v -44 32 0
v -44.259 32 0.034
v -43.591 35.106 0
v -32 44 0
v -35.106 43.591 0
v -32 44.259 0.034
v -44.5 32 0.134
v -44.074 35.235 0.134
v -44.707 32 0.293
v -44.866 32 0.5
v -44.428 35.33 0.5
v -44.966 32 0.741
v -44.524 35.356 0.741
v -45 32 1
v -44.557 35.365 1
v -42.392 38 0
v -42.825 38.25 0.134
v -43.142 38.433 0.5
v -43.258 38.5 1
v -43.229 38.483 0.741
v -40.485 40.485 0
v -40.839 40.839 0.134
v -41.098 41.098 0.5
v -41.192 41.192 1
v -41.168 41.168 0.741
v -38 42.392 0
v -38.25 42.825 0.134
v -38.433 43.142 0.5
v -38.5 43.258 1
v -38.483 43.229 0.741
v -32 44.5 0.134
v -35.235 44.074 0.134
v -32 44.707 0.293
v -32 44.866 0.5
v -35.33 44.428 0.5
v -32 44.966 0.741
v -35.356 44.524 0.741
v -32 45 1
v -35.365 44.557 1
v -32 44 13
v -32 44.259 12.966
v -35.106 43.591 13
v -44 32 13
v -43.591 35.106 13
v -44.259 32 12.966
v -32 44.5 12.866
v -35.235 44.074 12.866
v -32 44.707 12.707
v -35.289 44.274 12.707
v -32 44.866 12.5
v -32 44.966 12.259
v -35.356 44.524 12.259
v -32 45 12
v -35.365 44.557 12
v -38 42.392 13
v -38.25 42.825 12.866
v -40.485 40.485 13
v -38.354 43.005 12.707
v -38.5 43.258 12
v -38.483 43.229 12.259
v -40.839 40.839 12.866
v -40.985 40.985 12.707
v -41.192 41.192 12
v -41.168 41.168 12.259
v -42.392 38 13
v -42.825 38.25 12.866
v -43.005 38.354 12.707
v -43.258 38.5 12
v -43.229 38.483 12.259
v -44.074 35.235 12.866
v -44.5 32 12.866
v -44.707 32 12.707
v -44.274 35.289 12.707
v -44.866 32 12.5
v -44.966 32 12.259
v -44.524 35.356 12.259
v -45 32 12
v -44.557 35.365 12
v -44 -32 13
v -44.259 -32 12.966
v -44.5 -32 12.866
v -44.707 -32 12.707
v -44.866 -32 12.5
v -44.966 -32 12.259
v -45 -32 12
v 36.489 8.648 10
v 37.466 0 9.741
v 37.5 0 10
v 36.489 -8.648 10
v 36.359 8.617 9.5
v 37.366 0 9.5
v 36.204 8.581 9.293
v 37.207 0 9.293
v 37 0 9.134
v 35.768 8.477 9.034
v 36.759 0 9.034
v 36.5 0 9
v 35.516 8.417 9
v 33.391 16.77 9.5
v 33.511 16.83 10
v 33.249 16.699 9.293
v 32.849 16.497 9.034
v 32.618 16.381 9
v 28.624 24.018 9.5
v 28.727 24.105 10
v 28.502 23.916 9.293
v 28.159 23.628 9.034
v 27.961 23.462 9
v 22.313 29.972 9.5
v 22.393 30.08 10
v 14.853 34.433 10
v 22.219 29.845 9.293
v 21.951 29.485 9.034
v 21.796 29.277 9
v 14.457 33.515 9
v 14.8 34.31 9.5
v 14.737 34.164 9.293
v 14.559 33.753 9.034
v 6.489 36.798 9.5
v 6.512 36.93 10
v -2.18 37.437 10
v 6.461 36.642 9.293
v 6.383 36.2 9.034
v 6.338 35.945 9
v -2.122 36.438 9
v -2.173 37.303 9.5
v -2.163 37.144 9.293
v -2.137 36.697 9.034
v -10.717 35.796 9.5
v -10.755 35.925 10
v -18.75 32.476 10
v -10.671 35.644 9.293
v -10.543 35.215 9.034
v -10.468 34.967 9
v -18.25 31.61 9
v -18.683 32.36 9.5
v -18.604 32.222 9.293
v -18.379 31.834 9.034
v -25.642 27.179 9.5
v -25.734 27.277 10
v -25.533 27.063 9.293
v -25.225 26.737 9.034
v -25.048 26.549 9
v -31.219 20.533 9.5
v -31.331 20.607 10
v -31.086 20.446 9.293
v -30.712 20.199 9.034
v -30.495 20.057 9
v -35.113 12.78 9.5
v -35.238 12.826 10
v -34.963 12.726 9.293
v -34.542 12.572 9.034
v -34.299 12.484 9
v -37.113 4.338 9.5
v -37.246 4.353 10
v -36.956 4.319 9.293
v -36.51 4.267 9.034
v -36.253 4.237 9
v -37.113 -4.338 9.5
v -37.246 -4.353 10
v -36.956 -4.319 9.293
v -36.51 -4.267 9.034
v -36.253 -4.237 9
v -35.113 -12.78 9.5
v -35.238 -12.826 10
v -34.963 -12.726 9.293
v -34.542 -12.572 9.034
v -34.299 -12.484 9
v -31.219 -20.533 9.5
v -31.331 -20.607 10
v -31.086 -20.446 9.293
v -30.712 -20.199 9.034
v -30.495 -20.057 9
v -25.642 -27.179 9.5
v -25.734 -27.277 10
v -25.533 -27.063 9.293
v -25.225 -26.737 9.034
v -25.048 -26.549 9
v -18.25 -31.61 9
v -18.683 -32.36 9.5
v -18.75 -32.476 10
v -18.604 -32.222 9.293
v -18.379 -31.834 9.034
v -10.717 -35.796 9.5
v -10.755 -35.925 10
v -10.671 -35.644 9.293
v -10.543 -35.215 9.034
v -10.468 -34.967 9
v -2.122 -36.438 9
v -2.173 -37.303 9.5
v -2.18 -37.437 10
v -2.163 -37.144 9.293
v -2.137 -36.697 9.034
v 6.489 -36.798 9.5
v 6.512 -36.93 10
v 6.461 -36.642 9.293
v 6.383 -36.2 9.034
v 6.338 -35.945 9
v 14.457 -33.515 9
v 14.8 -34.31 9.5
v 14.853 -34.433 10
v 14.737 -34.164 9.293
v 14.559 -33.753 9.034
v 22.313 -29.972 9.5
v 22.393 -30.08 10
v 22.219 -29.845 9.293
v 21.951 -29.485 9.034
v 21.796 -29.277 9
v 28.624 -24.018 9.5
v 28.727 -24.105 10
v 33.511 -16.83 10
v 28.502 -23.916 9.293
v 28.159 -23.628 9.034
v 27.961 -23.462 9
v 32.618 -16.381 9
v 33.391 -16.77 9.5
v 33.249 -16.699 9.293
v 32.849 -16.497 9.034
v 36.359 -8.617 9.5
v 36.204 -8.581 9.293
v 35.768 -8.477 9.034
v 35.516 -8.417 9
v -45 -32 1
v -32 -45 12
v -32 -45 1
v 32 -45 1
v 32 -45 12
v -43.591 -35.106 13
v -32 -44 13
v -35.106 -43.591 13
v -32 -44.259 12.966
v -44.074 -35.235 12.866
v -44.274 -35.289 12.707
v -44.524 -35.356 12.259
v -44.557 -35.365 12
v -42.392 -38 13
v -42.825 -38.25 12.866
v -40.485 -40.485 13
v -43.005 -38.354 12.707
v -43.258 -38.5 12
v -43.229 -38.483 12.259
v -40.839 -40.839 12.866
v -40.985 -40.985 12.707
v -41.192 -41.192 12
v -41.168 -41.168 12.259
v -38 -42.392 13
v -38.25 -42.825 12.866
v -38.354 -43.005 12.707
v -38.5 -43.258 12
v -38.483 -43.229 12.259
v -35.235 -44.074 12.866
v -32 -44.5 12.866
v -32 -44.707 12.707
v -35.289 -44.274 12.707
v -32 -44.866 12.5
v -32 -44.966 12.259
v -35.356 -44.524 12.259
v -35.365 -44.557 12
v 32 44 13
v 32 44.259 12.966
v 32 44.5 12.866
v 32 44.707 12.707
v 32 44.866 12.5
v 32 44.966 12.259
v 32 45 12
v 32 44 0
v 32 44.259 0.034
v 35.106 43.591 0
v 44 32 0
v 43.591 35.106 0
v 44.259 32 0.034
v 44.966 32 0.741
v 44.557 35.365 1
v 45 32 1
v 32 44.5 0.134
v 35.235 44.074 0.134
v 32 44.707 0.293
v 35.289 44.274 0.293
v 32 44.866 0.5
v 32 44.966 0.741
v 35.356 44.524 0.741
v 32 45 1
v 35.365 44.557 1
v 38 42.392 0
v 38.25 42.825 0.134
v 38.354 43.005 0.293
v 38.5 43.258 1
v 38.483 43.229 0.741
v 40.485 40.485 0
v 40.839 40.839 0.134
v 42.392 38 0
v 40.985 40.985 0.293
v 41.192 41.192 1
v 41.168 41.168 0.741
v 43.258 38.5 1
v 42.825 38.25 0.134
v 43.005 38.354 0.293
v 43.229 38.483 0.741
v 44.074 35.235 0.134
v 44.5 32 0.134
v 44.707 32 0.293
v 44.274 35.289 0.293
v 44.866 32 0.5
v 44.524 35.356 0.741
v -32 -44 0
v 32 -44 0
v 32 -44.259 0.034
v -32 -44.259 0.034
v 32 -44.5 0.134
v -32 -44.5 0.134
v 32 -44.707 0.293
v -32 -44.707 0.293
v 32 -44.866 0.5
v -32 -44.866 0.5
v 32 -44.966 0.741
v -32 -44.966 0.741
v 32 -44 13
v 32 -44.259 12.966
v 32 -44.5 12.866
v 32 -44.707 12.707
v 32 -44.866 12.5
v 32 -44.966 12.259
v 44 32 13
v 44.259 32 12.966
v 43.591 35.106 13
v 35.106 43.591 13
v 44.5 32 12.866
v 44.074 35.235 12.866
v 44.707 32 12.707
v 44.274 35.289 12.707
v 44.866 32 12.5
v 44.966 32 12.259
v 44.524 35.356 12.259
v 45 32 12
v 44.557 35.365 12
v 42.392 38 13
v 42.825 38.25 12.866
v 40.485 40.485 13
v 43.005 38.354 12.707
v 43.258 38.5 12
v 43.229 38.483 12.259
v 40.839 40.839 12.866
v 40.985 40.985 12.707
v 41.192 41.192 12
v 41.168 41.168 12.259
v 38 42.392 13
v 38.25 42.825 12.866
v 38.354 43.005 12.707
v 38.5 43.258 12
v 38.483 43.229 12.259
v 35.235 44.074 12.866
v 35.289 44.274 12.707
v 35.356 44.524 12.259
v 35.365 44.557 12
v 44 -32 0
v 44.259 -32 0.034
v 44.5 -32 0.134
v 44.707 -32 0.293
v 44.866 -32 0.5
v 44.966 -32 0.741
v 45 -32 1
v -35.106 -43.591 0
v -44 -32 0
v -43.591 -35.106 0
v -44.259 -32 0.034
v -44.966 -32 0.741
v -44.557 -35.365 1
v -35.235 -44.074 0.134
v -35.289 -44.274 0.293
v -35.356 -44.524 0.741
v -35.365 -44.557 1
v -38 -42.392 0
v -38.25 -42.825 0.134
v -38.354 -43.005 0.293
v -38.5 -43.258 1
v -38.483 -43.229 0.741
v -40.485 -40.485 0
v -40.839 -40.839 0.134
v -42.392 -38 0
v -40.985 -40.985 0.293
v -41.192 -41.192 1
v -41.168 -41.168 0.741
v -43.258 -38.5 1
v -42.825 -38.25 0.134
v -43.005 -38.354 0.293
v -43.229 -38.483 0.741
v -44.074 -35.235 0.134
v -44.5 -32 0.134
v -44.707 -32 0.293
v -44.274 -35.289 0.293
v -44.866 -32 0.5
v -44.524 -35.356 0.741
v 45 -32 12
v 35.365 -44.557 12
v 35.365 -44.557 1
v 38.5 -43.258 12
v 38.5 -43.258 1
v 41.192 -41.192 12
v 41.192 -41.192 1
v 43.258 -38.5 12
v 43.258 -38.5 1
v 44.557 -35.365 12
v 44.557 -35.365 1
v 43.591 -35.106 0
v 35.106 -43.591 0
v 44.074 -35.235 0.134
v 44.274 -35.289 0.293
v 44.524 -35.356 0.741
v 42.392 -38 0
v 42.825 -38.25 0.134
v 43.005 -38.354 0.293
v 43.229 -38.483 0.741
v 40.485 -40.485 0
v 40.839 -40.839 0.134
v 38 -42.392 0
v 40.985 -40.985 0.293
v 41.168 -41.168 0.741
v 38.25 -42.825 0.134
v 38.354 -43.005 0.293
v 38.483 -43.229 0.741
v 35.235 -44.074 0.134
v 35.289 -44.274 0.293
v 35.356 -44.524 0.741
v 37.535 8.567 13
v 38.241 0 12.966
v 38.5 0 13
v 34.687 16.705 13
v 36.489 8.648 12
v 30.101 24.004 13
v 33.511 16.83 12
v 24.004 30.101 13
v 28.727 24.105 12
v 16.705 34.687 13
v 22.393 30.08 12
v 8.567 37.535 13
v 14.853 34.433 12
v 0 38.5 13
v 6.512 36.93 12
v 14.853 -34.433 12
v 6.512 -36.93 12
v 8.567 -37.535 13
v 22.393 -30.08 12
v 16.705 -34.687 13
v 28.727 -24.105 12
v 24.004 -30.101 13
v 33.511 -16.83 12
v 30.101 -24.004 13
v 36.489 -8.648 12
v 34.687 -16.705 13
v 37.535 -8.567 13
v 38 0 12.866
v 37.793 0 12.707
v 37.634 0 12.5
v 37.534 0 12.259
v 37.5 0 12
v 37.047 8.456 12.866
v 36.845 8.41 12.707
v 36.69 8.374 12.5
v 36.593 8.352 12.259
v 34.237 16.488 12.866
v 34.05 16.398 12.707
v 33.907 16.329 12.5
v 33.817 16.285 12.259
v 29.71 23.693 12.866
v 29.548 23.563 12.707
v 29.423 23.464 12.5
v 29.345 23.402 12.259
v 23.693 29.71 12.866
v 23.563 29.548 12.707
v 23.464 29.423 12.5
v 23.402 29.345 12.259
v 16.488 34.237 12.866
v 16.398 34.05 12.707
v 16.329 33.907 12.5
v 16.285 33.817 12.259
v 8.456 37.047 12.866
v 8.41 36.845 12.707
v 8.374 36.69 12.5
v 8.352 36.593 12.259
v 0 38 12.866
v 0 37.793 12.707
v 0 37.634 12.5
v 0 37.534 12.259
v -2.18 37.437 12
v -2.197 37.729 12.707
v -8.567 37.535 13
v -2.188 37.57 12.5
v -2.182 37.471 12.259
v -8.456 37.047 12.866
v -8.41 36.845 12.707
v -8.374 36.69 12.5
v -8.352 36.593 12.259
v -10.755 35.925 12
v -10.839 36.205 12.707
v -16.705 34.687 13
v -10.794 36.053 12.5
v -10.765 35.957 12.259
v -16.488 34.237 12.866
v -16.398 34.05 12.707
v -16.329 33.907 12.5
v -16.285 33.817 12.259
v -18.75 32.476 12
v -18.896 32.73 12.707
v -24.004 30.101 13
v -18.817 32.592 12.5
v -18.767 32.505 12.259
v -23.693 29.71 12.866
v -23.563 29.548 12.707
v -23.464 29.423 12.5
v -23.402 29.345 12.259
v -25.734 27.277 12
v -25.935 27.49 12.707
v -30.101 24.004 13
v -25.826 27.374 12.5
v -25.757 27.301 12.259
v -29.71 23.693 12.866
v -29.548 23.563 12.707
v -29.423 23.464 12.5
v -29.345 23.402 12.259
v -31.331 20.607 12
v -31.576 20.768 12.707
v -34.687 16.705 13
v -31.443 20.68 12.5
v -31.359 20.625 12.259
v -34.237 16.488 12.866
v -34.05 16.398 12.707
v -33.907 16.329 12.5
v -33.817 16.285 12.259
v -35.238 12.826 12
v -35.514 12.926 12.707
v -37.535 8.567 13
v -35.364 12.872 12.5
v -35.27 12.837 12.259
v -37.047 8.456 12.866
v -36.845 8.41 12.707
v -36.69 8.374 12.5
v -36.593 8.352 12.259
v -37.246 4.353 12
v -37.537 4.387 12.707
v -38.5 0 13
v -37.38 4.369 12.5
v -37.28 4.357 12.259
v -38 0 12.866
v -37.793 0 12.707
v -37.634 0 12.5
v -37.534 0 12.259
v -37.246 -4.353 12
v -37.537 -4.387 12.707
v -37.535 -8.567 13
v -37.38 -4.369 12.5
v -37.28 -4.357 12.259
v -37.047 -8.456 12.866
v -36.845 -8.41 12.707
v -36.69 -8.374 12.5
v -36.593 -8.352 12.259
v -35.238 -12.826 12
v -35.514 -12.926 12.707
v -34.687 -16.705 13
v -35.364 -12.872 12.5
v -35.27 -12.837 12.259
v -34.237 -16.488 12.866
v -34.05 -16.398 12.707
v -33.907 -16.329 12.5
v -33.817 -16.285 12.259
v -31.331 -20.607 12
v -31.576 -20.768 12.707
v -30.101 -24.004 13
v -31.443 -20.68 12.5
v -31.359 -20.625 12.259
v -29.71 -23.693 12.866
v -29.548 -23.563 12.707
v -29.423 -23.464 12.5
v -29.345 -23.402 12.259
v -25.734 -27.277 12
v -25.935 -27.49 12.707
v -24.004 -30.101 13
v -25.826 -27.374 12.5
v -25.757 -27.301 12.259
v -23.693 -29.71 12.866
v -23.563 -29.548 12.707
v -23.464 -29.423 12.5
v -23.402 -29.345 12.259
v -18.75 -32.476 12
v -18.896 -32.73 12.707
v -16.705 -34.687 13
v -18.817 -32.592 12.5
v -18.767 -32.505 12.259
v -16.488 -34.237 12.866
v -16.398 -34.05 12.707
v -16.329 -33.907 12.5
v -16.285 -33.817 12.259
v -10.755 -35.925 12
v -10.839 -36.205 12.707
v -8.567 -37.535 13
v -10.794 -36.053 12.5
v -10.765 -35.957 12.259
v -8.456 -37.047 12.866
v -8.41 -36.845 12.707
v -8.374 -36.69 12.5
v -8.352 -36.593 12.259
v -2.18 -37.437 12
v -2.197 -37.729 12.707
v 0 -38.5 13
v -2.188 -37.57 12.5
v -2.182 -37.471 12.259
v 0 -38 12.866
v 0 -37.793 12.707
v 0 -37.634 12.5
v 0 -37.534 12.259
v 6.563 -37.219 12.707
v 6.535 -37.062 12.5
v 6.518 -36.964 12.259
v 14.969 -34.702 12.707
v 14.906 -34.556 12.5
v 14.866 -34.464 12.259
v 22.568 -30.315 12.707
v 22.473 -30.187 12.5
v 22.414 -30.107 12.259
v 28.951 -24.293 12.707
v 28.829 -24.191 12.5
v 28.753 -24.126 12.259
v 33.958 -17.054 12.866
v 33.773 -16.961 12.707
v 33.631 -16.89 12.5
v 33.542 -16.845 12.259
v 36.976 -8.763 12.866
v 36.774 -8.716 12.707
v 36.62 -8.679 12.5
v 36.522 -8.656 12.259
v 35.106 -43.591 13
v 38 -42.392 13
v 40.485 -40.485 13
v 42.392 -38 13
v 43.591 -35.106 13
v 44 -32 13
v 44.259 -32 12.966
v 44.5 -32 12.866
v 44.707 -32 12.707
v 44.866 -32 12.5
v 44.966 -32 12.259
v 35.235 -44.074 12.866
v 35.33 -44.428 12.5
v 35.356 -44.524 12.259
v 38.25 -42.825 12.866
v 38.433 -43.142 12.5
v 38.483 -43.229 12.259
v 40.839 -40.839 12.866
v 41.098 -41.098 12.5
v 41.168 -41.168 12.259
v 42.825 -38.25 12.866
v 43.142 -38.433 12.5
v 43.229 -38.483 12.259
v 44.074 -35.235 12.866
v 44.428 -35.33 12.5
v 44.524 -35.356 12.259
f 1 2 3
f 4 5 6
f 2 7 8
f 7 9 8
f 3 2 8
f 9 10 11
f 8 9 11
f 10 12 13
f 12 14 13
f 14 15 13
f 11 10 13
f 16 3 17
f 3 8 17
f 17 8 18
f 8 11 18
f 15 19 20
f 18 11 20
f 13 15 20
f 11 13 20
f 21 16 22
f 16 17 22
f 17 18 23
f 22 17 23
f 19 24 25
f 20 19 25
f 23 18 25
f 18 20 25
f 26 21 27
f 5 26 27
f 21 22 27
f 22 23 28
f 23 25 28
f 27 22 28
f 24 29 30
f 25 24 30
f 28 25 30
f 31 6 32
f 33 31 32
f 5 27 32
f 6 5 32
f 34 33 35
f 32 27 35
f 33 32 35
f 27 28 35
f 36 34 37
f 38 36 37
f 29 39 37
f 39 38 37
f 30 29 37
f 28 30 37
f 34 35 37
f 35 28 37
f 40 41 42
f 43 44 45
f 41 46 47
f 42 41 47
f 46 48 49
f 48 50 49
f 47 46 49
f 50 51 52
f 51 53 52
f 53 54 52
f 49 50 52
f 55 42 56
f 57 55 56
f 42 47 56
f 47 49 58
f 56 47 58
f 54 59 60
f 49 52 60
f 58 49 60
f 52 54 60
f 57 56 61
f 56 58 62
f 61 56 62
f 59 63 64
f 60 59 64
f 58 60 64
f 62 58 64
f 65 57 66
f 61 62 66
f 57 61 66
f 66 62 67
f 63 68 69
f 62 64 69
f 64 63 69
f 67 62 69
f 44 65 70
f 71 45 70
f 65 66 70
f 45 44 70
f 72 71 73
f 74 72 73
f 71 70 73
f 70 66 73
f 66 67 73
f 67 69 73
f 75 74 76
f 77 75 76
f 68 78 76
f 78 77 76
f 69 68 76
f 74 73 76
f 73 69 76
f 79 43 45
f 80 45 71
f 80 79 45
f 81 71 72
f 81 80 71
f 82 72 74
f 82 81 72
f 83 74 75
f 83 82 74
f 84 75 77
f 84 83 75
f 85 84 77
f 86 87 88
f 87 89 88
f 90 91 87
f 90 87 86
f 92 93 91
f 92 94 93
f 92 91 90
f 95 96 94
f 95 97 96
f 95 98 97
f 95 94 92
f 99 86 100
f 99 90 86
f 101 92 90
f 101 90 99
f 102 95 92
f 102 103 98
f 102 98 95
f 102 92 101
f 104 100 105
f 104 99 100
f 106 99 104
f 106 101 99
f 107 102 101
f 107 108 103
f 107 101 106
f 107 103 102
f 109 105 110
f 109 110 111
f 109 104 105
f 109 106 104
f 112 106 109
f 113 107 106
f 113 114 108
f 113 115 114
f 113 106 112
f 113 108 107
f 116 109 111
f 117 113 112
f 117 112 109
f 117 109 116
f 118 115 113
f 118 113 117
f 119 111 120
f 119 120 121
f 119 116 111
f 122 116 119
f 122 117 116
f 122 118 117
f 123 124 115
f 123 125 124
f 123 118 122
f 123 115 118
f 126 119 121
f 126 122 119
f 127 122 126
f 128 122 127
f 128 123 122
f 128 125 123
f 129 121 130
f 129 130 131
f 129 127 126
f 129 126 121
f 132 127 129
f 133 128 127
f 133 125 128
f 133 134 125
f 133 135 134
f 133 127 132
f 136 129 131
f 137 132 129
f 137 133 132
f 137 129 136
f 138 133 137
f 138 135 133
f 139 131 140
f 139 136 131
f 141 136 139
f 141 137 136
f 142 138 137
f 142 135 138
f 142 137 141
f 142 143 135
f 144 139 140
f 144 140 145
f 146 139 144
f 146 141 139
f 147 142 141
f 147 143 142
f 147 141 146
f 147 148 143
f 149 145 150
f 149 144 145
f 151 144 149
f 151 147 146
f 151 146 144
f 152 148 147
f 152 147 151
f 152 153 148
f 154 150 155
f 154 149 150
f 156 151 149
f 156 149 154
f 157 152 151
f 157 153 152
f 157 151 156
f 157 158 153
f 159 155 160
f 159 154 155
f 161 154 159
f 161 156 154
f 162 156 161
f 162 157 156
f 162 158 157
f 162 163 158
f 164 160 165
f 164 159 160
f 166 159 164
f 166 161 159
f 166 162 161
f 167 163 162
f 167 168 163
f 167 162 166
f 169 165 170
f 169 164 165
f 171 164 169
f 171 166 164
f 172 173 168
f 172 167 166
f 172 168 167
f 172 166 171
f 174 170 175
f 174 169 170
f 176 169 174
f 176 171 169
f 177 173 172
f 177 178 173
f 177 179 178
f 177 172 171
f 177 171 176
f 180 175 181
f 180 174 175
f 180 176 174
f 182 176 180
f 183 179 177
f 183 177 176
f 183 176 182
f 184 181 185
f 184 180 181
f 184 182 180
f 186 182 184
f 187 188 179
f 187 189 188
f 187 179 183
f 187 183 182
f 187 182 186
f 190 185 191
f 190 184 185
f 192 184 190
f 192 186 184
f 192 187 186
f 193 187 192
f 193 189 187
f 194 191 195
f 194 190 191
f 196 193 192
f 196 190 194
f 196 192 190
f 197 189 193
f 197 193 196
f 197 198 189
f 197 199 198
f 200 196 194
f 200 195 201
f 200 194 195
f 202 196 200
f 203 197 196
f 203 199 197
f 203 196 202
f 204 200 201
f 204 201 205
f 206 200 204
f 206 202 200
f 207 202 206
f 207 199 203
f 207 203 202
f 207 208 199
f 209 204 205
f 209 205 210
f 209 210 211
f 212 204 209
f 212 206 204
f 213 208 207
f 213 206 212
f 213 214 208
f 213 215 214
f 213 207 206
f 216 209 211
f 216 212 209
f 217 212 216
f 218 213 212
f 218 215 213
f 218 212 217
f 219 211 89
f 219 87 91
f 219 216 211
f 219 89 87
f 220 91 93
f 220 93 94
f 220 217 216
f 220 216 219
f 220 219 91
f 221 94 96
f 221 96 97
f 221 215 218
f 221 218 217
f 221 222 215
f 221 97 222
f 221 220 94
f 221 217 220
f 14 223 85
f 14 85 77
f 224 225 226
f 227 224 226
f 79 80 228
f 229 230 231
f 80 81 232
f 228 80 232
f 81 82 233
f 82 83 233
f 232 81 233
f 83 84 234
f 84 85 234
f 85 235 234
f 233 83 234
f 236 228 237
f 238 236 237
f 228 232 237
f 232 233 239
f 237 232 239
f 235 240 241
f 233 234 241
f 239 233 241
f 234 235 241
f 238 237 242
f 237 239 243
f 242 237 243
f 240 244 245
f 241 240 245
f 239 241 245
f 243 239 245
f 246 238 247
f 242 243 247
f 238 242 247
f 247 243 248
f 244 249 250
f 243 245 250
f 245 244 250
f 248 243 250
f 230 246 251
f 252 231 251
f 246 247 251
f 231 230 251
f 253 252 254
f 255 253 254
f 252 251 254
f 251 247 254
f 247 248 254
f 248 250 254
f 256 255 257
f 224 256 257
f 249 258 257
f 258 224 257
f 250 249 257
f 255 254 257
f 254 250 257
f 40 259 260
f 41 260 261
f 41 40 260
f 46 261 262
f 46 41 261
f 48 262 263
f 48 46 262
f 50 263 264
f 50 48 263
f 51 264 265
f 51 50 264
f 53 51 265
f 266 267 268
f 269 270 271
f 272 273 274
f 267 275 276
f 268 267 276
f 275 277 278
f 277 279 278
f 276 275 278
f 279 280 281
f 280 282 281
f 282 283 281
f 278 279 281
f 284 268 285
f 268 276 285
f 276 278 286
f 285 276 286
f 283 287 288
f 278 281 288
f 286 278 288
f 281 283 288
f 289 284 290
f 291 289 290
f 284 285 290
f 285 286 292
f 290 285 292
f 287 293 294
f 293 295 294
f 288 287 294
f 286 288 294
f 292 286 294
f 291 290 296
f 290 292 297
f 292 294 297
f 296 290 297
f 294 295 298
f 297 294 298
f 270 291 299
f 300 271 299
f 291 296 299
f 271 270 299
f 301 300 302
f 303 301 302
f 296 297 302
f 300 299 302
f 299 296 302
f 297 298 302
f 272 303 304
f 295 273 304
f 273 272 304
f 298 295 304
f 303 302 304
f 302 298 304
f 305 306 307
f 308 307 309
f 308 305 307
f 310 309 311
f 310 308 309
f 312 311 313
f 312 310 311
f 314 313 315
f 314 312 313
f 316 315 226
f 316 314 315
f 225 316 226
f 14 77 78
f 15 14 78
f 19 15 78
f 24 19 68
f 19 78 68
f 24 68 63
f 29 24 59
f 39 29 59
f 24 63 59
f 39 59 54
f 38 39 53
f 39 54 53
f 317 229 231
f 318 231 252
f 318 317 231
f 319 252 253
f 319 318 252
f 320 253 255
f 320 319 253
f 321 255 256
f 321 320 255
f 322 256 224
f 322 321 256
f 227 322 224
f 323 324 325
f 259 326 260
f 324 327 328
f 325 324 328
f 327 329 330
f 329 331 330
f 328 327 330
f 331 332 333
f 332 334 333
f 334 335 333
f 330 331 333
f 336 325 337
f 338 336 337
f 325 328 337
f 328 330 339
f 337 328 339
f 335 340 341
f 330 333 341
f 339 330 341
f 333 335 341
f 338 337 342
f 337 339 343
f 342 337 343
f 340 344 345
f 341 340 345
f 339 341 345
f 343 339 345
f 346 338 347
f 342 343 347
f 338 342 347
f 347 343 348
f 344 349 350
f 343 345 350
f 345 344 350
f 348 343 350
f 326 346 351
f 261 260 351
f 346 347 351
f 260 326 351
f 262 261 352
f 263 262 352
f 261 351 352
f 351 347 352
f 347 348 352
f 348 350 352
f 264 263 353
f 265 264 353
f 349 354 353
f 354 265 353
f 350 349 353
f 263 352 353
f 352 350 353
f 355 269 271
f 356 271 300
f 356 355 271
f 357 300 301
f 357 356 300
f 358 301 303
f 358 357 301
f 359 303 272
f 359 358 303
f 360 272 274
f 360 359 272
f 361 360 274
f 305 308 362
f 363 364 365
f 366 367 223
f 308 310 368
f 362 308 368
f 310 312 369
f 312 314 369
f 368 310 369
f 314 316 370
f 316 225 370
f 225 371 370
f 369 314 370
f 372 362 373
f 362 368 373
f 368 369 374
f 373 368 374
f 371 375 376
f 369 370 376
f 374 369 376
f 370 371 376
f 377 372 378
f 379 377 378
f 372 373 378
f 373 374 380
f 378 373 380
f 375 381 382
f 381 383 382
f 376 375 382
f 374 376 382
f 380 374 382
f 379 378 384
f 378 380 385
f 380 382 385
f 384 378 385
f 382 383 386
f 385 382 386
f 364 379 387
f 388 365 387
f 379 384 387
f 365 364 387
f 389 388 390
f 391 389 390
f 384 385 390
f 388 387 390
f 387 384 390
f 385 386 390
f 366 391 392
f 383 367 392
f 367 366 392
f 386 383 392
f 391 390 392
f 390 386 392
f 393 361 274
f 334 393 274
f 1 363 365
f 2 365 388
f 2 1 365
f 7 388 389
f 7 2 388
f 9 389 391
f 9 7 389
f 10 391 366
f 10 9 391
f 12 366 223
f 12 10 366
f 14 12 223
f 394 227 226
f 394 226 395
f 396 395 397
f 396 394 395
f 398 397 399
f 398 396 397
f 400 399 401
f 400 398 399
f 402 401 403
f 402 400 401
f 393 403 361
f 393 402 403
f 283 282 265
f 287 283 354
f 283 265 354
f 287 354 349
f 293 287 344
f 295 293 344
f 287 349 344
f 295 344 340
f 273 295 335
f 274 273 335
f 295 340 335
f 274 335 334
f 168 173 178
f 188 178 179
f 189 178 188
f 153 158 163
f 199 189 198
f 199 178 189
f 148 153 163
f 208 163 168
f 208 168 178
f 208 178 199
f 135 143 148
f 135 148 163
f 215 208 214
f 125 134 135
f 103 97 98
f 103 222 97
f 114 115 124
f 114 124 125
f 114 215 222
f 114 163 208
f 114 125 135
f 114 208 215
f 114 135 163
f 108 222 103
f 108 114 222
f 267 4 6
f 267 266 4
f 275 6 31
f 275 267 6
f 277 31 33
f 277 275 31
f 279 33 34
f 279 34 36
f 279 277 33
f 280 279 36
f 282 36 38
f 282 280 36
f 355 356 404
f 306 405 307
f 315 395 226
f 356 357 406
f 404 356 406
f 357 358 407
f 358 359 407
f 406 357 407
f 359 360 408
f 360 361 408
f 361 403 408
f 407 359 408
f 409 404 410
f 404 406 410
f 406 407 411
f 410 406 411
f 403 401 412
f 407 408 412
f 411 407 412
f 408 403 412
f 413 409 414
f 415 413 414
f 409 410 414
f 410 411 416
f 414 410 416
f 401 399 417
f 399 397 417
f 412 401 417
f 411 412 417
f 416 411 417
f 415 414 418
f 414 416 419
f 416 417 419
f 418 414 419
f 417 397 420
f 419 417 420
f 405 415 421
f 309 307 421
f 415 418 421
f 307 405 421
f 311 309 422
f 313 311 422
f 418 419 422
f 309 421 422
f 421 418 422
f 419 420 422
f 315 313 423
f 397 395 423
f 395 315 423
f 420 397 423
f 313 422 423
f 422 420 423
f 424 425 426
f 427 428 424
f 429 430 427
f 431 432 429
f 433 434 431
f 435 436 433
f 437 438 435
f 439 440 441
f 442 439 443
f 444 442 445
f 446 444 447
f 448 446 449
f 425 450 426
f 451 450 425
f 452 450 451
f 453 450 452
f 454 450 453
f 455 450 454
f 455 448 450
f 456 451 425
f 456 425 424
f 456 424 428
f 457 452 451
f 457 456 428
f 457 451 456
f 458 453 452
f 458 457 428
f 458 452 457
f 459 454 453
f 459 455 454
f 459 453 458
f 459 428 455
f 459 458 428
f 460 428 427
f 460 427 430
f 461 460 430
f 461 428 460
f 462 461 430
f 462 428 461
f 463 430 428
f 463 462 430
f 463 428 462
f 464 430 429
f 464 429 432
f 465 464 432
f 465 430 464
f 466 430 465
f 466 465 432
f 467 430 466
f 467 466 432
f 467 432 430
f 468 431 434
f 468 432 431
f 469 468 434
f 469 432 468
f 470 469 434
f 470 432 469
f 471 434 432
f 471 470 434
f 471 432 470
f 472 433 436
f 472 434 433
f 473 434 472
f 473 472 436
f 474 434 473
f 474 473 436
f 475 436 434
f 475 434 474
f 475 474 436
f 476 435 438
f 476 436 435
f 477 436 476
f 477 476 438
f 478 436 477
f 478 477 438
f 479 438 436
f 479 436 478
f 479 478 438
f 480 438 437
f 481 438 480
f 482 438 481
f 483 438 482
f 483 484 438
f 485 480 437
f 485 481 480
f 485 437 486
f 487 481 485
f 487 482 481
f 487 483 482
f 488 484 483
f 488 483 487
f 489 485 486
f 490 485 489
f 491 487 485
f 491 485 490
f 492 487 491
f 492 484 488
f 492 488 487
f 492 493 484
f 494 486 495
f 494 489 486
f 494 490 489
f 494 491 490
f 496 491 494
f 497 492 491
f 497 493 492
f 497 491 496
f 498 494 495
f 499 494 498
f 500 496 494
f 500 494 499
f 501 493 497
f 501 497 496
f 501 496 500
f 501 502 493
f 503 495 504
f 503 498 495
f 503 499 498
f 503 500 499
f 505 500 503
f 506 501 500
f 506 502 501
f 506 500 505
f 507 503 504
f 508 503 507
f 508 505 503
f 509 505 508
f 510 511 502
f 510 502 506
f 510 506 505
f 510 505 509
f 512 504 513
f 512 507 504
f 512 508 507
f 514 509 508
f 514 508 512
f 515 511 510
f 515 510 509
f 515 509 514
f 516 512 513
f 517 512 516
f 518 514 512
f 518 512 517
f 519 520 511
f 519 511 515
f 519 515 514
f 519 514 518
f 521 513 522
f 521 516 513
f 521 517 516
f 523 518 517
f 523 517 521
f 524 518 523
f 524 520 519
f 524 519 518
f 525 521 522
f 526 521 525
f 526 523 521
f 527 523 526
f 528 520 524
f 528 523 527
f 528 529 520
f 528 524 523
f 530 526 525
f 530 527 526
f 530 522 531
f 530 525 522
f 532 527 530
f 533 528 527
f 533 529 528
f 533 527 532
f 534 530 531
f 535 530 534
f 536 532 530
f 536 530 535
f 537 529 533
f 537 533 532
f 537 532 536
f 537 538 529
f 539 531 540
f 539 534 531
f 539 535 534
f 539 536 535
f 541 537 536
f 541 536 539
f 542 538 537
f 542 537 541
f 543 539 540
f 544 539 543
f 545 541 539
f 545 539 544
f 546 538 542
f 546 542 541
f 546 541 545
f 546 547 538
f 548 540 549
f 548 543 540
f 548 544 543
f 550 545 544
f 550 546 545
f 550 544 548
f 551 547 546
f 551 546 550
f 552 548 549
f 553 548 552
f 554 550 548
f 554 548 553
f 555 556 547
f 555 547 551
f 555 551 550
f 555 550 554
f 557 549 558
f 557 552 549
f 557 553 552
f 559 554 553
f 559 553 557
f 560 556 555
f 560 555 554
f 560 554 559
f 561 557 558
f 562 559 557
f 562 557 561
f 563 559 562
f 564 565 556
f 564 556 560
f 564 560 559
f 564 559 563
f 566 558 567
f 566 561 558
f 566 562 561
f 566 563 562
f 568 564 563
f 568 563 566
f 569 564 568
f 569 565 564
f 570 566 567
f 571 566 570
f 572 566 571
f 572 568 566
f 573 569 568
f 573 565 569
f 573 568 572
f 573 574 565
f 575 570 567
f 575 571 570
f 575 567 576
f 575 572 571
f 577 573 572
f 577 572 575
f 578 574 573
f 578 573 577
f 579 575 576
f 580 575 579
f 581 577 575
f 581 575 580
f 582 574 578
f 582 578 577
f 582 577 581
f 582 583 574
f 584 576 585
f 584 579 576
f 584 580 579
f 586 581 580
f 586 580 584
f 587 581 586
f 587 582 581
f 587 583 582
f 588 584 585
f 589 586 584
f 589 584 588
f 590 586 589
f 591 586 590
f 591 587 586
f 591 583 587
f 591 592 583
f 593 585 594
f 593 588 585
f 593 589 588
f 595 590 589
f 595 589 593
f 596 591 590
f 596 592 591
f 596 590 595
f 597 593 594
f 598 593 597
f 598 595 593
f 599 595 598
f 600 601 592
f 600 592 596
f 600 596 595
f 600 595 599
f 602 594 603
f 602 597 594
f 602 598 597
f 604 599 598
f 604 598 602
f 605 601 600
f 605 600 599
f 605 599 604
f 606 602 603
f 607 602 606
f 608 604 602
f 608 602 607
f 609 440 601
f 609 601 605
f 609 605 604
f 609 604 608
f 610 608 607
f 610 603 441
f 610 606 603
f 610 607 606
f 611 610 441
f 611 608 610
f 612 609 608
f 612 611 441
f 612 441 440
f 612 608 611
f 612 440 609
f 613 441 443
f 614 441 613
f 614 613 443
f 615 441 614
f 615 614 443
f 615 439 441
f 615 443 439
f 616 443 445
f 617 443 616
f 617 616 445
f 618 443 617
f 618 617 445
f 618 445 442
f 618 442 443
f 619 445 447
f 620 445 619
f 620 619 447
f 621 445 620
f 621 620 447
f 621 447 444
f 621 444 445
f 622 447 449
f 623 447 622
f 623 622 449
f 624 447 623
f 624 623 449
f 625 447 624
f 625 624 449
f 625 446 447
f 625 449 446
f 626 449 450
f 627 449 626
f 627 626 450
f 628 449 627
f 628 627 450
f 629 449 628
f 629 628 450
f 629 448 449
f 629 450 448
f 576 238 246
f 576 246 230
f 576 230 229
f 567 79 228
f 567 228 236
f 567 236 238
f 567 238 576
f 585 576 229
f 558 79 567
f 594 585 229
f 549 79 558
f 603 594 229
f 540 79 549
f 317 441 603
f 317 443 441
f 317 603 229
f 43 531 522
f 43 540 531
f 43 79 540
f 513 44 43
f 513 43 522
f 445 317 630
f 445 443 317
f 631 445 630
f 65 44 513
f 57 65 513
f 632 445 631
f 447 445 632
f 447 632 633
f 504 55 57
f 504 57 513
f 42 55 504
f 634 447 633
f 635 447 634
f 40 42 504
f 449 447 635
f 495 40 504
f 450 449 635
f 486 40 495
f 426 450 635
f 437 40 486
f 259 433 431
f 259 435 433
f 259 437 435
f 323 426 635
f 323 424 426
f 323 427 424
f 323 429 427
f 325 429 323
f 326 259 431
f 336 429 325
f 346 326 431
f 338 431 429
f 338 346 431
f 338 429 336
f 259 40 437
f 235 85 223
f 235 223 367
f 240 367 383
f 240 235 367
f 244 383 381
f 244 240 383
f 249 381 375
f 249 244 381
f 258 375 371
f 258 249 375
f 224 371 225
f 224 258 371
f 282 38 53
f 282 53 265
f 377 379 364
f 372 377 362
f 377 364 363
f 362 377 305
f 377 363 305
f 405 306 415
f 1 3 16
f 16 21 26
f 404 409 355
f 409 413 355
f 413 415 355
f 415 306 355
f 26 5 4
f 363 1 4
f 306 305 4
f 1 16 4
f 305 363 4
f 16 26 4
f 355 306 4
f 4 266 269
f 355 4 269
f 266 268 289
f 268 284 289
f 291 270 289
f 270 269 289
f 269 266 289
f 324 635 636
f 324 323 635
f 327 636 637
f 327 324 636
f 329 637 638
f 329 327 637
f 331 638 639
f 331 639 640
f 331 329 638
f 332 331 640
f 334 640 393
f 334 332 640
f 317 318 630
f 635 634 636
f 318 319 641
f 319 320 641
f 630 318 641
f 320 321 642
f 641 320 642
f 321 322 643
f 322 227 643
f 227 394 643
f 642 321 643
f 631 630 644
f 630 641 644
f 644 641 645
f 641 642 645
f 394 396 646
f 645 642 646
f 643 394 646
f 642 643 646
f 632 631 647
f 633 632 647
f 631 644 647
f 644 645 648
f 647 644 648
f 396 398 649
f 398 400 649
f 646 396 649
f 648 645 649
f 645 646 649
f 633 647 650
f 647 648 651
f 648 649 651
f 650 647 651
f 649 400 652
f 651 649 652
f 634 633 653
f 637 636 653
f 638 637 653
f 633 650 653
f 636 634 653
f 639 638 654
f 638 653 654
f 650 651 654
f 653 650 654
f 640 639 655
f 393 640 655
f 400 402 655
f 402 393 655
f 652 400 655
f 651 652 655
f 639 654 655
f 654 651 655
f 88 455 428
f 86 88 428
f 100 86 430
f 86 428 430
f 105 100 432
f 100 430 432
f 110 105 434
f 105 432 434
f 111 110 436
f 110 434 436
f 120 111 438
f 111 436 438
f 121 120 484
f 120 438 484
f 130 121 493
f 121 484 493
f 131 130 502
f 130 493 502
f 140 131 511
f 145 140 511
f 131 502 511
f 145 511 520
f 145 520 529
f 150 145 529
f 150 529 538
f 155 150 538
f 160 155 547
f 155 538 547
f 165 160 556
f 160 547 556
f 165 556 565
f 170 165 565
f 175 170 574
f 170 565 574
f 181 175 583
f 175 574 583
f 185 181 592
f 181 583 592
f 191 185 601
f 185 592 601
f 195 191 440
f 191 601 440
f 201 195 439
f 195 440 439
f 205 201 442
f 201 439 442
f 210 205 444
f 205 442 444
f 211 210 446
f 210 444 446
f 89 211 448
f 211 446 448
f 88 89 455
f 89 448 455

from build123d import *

# Parameters (mm, degrees)
F0_W     = 90
F0_H     = 90
F1_DEPTH = 13
F2_R     = 37.5
F3_DEPTH = 4
F4_R     = 13
F5_R     = 1


with BuildPart() as f1:
    # F0 (on Top) → F1 (new body)
    with BuildSketch(Plane.XY):
        Rectangle(F0_W, F0_H)
    extrude(amount=F1_DEPTH)

    # F2 (on face) → F3 (cut)
    with BuildSketch(Plane.XY.offset(13)):
        Circle(F2_R)
    extrude(amount=-F3_DEPTH, mode=Mode.SUBTRACT)

    # F4
    f4_edges = [f1.edges().sort_by_distance(p)[0] for p in [
        (45, 45, 6.5),
        (-45, 45, 6.5),
        (-45, -45, 6.5),
        (45, -45, 6.5),
    ]]
    fillet(f4_edges, radius=F4_R)

    # F5
    f5_edges = [f1.edges().sort_by_distance(p)[0] for p in [
        (45, 0, 13),
        (0, 45, 0),
        (37.5, 0, 11),
        (-37.5, 0, 13),
        (-37.5, 0, 9),
    ]]
    fillet(f5_edges, radius=F5_R)


solid = f1.part
